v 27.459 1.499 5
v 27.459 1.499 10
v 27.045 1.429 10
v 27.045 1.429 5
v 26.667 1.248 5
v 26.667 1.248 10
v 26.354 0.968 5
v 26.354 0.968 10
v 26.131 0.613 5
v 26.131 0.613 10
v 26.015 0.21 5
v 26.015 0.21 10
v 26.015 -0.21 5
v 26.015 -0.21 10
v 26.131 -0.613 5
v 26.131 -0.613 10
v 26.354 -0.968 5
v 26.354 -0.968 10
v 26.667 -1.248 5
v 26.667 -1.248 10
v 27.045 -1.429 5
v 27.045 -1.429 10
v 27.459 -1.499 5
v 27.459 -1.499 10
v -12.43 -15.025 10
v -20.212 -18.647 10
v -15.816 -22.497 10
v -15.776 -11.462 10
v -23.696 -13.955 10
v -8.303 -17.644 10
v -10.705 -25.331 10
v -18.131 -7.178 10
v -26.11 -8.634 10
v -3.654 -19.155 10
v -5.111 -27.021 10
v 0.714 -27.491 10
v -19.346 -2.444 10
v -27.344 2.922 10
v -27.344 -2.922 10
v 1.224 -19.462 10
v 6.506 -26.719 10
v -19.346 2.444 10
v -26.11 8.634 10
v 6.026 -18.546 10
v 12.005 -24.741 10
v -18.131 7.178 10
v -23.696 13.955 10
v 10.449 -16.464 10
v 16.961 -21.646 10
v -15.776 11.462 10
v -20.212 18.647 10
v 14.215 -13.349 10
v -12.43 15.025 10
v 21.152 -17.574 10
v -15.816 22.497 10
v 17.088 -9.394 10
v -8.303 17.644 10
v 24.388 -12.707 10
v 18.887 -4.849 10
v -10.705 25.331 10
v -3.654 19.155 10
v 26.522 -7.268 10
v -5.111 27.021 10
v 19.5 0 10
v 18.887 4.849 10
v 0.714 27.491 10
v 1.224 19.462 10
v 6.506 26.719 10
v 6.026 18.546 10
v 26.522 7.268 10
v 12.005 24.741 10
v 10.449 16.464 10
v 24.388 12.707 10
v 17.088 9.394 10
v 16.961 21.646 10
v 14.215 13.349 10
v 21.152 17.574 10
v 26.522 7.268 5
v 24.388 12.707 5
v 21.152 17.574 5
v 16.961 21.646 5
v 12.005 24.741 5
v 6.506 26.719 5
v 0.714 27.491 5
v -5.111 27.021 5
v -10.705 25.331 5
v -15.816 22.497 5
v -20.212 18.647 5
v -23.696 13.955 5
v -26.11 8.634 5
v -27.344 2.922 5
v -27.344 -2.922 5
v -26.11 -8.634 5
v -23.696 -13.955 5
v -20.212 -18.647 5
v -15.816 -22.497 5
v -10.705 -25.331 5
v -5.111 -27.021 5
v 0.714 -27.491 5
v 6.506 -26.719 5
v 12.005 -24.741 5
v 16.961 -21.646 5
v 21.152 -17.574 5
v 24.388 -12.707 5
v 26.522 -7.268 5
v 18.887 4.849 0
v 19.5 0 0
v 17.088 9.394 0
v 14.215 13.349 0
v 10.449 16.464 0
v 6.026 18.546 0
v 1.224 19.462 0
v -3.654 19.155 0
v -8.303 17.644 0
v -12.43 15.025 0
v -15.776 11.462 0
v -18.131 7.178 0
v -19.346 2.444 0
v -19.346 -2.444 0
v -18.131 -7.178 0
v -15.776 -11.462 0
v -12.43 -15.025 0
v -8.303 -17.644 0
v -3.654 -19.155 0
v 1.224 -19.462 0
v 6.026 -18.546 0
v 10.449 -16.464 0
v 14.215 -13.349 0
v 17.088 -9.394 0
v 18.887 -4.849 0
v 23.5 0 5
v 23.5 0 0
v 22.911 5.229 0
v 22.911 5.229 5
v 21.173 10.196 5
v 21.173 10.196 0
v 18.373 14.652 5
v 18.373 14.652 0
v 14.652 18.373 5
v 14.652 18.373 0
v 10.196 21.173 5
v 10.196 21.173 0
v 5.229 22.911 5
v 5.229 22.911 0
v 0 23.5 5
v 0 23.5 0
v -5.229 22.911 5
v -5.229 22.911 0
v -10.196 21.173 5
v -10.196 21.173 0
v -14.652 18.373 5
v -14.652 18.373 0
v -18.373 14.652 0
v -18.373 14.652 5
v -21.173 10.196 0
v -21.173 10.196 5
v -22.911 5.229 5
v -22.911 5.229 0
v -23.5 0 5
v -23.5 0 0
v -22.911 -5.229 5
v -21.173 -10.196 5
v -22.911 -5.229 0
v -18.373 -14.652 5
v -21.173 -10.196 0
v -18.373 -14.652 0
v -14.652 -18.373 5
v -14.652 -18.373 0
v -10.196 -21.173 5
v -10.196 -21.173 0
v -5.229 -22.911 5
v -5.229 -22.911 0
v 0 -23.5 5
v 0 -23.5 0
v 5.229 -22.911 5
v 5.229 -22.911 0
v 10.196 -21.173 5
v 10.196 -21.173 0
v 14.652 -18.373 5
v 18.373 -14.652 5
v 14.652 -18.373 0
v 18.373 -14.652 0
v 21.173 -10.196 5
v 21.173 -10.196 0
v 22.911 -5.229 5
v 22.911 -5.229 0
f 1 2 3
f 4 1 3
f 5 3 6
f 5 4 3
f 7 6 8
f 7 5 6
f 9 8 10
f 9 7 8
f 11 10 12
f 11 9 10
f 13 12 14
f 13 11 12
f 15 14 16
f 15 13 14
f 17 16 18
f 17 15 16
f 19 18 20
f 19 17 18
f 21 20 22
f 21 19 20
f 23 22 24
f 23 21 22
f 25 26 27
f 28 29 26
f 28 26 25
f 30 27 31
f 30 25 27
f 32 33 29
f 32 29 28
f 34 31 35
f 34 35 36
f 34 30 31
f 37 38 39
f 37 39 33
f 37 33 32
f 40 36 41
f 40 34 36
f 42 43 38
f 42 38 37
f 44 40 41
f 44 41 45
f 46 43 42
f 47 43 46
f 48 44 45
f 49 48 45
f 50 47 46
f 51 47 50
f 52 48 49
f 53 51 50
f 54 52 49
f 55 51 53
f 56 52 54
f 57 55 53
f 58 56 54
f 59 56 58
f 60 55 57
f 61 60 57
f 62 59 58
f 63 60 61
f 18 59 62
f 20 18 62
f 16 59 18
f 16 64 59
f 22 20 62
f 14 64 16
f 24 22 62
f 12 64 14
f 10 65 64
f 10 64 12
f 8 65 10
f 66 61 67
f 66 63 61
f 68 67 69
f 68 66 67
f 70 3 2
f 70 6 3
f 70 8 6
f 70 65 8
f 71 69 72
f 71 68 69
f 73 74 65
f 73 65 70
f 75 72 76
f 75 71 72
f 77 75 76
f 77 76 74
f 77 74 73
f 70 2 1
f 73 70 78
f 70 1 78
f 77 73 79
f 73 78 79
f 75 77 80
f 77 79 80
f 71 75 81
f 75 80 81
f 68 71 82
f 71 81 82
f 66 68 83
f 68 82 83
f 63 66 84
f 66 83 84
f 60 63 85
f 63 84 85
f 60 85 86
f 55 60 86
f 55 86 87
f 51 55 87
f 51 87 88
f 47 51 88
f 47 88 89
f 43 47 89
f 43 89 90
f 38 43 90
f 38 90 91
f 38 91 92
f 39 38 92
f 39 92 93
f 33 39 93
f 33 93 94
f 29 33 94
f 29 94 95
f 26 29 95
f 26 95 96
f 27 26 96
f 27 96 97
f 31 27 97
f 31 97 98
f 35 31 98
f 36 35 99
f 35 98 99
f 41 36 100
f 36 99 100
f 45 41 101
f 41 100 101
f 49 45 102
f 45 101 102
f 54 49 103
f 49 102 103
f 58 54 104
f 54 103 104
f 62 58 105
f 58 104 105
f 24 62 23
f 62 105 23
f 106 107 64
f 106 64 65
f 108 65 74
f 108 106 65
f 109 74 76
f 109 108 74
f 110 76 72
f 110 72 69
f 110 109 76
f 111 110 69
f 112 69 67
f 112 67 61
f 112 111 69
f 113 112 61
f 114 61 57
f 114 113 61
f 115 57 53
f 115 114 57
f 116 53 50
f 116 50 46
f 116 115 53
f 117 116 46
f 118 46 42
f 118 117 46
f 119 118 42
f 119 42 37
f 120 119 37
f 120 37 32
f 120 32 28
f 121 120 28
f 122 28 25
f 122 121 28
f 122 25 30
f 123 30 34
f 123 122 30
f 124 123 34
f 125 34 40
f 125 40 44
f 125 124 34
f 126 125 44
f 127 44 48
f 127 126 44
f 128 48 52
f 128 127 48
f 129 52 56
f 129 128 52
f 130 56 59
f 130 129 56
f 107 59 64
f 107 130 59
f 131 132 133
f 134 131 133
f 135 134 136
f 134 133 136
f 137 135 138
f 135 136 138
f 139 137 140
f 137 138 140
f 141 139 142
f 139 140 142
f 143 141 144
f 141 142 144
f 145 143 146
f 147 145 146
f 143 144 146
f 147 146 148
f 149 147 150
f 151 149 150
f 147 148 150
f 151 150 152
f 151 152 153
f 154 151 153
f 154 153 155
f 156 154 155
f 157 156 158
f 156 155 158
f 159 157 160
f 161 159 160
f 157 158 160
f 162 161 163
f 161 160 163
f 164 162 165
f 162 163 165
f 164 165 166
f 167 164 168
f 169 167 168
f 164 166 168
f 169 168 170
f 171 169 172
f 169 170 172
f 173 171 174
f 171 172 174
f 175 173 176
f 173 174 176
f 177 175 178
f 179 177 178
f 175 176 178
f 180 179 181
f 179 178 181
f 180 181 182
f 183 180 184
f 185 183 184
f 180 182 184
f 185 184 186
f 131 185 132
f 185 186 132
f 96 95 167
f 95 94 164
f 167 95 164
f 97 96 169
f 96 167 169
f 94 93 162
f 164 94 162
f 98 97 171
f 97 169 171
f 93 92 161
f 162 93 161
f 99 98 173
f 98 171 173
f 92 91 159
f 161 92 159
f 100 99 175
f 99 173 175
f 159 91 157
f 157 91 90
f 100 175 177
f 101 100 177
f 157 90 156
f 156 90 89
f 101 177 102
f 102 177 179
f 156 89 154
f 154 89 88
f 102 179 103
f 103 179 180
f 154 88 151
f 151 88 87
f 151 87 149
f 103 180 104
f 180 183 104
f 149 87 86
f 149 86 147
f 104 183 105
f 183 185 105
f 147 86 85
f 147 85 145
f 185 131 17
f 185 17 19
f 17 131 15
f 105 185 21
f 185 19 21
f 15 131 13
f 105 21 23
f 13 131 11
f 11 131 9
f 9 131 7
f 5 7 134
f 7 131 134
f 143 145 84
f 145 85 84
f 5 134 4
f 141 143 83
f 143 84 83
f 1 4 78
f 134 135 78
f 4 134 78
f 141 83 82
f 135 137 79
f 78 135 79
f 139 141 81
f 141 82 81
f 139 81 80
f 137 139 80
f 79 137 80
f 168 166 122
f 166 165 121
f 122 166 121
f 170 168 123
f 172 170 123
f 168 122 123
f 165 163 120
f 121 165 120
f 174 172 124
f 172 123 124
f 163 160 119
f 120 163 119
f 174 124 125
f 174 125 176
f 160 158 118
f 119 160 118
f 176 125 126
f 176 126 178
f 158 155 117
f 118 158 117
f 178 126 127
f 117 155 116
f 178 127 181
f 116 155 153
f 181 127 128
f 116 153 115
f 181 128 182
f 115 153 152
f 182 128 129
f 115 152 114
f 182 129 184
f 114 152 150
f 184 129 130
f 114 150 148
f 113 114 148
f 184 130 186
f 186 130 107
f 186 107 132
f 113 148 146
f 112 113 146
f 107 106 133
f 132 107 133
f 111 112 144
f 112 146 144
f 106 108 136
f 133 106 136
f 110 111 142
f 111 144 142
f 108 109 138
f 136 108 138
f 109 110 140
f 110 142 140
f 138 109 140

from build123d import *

# Parameters (mm, degrees)
SKETCH_R          = 27.5
SKETCH_R_2        = 19.5
PAD_DEPTH         = 10
SKETCH001_R       = 1.5
POCKET_DEPTH      = 10
SKETCH002_R       = 1.5
POCKET001_DEPTH   = 1.5
COPYSKETCH003_R   = 27.5
COPYSKETCH003_R_2 = 23.5
POCKET002_DEPTH   = 5


with BuildPart() as part:
    # Sketch → Pad (new body)
    with BuildSketch(Plane.XY):
        Circle(SKETCH_R)
        Circle(SKETCH_R_2, mode=Mode.SUBTRACT)
    extrude(amount=PAD_DEPTH)

    # Sketch001 → Pocket (cut)
    with BuildSketch(Plane(origin=(27.5, 0, 0), x_dir=(1, 0, 0), z_dir=(0, 0, 1))):
        Circle(SKETCH001_R)
    extrude(amount=POCKET_DEPTH, mode=Mode.SUBTRACT)

    # Sketch002 → Pocket001 (cut)
    with BuildSketch(Plane.YZ.offset(27.5)):
        Circle(SKETCH002_R)
    extrude(amount=-POCKET001_DEPTH, mode=Mode.SUBTRACT)

    # CopySketch003 → Pocket002 (cut)
    with BuildSketch(Plane.XY):
        Circle(COPYSKETCH003_R)
        Circle(COPYSKETCH003_R_2, mode=Mode.SUBTRACT)
    extrude(amount=POCKET002_DEPTH, mode=Mode.SUBTRACT)


solid = part.part
